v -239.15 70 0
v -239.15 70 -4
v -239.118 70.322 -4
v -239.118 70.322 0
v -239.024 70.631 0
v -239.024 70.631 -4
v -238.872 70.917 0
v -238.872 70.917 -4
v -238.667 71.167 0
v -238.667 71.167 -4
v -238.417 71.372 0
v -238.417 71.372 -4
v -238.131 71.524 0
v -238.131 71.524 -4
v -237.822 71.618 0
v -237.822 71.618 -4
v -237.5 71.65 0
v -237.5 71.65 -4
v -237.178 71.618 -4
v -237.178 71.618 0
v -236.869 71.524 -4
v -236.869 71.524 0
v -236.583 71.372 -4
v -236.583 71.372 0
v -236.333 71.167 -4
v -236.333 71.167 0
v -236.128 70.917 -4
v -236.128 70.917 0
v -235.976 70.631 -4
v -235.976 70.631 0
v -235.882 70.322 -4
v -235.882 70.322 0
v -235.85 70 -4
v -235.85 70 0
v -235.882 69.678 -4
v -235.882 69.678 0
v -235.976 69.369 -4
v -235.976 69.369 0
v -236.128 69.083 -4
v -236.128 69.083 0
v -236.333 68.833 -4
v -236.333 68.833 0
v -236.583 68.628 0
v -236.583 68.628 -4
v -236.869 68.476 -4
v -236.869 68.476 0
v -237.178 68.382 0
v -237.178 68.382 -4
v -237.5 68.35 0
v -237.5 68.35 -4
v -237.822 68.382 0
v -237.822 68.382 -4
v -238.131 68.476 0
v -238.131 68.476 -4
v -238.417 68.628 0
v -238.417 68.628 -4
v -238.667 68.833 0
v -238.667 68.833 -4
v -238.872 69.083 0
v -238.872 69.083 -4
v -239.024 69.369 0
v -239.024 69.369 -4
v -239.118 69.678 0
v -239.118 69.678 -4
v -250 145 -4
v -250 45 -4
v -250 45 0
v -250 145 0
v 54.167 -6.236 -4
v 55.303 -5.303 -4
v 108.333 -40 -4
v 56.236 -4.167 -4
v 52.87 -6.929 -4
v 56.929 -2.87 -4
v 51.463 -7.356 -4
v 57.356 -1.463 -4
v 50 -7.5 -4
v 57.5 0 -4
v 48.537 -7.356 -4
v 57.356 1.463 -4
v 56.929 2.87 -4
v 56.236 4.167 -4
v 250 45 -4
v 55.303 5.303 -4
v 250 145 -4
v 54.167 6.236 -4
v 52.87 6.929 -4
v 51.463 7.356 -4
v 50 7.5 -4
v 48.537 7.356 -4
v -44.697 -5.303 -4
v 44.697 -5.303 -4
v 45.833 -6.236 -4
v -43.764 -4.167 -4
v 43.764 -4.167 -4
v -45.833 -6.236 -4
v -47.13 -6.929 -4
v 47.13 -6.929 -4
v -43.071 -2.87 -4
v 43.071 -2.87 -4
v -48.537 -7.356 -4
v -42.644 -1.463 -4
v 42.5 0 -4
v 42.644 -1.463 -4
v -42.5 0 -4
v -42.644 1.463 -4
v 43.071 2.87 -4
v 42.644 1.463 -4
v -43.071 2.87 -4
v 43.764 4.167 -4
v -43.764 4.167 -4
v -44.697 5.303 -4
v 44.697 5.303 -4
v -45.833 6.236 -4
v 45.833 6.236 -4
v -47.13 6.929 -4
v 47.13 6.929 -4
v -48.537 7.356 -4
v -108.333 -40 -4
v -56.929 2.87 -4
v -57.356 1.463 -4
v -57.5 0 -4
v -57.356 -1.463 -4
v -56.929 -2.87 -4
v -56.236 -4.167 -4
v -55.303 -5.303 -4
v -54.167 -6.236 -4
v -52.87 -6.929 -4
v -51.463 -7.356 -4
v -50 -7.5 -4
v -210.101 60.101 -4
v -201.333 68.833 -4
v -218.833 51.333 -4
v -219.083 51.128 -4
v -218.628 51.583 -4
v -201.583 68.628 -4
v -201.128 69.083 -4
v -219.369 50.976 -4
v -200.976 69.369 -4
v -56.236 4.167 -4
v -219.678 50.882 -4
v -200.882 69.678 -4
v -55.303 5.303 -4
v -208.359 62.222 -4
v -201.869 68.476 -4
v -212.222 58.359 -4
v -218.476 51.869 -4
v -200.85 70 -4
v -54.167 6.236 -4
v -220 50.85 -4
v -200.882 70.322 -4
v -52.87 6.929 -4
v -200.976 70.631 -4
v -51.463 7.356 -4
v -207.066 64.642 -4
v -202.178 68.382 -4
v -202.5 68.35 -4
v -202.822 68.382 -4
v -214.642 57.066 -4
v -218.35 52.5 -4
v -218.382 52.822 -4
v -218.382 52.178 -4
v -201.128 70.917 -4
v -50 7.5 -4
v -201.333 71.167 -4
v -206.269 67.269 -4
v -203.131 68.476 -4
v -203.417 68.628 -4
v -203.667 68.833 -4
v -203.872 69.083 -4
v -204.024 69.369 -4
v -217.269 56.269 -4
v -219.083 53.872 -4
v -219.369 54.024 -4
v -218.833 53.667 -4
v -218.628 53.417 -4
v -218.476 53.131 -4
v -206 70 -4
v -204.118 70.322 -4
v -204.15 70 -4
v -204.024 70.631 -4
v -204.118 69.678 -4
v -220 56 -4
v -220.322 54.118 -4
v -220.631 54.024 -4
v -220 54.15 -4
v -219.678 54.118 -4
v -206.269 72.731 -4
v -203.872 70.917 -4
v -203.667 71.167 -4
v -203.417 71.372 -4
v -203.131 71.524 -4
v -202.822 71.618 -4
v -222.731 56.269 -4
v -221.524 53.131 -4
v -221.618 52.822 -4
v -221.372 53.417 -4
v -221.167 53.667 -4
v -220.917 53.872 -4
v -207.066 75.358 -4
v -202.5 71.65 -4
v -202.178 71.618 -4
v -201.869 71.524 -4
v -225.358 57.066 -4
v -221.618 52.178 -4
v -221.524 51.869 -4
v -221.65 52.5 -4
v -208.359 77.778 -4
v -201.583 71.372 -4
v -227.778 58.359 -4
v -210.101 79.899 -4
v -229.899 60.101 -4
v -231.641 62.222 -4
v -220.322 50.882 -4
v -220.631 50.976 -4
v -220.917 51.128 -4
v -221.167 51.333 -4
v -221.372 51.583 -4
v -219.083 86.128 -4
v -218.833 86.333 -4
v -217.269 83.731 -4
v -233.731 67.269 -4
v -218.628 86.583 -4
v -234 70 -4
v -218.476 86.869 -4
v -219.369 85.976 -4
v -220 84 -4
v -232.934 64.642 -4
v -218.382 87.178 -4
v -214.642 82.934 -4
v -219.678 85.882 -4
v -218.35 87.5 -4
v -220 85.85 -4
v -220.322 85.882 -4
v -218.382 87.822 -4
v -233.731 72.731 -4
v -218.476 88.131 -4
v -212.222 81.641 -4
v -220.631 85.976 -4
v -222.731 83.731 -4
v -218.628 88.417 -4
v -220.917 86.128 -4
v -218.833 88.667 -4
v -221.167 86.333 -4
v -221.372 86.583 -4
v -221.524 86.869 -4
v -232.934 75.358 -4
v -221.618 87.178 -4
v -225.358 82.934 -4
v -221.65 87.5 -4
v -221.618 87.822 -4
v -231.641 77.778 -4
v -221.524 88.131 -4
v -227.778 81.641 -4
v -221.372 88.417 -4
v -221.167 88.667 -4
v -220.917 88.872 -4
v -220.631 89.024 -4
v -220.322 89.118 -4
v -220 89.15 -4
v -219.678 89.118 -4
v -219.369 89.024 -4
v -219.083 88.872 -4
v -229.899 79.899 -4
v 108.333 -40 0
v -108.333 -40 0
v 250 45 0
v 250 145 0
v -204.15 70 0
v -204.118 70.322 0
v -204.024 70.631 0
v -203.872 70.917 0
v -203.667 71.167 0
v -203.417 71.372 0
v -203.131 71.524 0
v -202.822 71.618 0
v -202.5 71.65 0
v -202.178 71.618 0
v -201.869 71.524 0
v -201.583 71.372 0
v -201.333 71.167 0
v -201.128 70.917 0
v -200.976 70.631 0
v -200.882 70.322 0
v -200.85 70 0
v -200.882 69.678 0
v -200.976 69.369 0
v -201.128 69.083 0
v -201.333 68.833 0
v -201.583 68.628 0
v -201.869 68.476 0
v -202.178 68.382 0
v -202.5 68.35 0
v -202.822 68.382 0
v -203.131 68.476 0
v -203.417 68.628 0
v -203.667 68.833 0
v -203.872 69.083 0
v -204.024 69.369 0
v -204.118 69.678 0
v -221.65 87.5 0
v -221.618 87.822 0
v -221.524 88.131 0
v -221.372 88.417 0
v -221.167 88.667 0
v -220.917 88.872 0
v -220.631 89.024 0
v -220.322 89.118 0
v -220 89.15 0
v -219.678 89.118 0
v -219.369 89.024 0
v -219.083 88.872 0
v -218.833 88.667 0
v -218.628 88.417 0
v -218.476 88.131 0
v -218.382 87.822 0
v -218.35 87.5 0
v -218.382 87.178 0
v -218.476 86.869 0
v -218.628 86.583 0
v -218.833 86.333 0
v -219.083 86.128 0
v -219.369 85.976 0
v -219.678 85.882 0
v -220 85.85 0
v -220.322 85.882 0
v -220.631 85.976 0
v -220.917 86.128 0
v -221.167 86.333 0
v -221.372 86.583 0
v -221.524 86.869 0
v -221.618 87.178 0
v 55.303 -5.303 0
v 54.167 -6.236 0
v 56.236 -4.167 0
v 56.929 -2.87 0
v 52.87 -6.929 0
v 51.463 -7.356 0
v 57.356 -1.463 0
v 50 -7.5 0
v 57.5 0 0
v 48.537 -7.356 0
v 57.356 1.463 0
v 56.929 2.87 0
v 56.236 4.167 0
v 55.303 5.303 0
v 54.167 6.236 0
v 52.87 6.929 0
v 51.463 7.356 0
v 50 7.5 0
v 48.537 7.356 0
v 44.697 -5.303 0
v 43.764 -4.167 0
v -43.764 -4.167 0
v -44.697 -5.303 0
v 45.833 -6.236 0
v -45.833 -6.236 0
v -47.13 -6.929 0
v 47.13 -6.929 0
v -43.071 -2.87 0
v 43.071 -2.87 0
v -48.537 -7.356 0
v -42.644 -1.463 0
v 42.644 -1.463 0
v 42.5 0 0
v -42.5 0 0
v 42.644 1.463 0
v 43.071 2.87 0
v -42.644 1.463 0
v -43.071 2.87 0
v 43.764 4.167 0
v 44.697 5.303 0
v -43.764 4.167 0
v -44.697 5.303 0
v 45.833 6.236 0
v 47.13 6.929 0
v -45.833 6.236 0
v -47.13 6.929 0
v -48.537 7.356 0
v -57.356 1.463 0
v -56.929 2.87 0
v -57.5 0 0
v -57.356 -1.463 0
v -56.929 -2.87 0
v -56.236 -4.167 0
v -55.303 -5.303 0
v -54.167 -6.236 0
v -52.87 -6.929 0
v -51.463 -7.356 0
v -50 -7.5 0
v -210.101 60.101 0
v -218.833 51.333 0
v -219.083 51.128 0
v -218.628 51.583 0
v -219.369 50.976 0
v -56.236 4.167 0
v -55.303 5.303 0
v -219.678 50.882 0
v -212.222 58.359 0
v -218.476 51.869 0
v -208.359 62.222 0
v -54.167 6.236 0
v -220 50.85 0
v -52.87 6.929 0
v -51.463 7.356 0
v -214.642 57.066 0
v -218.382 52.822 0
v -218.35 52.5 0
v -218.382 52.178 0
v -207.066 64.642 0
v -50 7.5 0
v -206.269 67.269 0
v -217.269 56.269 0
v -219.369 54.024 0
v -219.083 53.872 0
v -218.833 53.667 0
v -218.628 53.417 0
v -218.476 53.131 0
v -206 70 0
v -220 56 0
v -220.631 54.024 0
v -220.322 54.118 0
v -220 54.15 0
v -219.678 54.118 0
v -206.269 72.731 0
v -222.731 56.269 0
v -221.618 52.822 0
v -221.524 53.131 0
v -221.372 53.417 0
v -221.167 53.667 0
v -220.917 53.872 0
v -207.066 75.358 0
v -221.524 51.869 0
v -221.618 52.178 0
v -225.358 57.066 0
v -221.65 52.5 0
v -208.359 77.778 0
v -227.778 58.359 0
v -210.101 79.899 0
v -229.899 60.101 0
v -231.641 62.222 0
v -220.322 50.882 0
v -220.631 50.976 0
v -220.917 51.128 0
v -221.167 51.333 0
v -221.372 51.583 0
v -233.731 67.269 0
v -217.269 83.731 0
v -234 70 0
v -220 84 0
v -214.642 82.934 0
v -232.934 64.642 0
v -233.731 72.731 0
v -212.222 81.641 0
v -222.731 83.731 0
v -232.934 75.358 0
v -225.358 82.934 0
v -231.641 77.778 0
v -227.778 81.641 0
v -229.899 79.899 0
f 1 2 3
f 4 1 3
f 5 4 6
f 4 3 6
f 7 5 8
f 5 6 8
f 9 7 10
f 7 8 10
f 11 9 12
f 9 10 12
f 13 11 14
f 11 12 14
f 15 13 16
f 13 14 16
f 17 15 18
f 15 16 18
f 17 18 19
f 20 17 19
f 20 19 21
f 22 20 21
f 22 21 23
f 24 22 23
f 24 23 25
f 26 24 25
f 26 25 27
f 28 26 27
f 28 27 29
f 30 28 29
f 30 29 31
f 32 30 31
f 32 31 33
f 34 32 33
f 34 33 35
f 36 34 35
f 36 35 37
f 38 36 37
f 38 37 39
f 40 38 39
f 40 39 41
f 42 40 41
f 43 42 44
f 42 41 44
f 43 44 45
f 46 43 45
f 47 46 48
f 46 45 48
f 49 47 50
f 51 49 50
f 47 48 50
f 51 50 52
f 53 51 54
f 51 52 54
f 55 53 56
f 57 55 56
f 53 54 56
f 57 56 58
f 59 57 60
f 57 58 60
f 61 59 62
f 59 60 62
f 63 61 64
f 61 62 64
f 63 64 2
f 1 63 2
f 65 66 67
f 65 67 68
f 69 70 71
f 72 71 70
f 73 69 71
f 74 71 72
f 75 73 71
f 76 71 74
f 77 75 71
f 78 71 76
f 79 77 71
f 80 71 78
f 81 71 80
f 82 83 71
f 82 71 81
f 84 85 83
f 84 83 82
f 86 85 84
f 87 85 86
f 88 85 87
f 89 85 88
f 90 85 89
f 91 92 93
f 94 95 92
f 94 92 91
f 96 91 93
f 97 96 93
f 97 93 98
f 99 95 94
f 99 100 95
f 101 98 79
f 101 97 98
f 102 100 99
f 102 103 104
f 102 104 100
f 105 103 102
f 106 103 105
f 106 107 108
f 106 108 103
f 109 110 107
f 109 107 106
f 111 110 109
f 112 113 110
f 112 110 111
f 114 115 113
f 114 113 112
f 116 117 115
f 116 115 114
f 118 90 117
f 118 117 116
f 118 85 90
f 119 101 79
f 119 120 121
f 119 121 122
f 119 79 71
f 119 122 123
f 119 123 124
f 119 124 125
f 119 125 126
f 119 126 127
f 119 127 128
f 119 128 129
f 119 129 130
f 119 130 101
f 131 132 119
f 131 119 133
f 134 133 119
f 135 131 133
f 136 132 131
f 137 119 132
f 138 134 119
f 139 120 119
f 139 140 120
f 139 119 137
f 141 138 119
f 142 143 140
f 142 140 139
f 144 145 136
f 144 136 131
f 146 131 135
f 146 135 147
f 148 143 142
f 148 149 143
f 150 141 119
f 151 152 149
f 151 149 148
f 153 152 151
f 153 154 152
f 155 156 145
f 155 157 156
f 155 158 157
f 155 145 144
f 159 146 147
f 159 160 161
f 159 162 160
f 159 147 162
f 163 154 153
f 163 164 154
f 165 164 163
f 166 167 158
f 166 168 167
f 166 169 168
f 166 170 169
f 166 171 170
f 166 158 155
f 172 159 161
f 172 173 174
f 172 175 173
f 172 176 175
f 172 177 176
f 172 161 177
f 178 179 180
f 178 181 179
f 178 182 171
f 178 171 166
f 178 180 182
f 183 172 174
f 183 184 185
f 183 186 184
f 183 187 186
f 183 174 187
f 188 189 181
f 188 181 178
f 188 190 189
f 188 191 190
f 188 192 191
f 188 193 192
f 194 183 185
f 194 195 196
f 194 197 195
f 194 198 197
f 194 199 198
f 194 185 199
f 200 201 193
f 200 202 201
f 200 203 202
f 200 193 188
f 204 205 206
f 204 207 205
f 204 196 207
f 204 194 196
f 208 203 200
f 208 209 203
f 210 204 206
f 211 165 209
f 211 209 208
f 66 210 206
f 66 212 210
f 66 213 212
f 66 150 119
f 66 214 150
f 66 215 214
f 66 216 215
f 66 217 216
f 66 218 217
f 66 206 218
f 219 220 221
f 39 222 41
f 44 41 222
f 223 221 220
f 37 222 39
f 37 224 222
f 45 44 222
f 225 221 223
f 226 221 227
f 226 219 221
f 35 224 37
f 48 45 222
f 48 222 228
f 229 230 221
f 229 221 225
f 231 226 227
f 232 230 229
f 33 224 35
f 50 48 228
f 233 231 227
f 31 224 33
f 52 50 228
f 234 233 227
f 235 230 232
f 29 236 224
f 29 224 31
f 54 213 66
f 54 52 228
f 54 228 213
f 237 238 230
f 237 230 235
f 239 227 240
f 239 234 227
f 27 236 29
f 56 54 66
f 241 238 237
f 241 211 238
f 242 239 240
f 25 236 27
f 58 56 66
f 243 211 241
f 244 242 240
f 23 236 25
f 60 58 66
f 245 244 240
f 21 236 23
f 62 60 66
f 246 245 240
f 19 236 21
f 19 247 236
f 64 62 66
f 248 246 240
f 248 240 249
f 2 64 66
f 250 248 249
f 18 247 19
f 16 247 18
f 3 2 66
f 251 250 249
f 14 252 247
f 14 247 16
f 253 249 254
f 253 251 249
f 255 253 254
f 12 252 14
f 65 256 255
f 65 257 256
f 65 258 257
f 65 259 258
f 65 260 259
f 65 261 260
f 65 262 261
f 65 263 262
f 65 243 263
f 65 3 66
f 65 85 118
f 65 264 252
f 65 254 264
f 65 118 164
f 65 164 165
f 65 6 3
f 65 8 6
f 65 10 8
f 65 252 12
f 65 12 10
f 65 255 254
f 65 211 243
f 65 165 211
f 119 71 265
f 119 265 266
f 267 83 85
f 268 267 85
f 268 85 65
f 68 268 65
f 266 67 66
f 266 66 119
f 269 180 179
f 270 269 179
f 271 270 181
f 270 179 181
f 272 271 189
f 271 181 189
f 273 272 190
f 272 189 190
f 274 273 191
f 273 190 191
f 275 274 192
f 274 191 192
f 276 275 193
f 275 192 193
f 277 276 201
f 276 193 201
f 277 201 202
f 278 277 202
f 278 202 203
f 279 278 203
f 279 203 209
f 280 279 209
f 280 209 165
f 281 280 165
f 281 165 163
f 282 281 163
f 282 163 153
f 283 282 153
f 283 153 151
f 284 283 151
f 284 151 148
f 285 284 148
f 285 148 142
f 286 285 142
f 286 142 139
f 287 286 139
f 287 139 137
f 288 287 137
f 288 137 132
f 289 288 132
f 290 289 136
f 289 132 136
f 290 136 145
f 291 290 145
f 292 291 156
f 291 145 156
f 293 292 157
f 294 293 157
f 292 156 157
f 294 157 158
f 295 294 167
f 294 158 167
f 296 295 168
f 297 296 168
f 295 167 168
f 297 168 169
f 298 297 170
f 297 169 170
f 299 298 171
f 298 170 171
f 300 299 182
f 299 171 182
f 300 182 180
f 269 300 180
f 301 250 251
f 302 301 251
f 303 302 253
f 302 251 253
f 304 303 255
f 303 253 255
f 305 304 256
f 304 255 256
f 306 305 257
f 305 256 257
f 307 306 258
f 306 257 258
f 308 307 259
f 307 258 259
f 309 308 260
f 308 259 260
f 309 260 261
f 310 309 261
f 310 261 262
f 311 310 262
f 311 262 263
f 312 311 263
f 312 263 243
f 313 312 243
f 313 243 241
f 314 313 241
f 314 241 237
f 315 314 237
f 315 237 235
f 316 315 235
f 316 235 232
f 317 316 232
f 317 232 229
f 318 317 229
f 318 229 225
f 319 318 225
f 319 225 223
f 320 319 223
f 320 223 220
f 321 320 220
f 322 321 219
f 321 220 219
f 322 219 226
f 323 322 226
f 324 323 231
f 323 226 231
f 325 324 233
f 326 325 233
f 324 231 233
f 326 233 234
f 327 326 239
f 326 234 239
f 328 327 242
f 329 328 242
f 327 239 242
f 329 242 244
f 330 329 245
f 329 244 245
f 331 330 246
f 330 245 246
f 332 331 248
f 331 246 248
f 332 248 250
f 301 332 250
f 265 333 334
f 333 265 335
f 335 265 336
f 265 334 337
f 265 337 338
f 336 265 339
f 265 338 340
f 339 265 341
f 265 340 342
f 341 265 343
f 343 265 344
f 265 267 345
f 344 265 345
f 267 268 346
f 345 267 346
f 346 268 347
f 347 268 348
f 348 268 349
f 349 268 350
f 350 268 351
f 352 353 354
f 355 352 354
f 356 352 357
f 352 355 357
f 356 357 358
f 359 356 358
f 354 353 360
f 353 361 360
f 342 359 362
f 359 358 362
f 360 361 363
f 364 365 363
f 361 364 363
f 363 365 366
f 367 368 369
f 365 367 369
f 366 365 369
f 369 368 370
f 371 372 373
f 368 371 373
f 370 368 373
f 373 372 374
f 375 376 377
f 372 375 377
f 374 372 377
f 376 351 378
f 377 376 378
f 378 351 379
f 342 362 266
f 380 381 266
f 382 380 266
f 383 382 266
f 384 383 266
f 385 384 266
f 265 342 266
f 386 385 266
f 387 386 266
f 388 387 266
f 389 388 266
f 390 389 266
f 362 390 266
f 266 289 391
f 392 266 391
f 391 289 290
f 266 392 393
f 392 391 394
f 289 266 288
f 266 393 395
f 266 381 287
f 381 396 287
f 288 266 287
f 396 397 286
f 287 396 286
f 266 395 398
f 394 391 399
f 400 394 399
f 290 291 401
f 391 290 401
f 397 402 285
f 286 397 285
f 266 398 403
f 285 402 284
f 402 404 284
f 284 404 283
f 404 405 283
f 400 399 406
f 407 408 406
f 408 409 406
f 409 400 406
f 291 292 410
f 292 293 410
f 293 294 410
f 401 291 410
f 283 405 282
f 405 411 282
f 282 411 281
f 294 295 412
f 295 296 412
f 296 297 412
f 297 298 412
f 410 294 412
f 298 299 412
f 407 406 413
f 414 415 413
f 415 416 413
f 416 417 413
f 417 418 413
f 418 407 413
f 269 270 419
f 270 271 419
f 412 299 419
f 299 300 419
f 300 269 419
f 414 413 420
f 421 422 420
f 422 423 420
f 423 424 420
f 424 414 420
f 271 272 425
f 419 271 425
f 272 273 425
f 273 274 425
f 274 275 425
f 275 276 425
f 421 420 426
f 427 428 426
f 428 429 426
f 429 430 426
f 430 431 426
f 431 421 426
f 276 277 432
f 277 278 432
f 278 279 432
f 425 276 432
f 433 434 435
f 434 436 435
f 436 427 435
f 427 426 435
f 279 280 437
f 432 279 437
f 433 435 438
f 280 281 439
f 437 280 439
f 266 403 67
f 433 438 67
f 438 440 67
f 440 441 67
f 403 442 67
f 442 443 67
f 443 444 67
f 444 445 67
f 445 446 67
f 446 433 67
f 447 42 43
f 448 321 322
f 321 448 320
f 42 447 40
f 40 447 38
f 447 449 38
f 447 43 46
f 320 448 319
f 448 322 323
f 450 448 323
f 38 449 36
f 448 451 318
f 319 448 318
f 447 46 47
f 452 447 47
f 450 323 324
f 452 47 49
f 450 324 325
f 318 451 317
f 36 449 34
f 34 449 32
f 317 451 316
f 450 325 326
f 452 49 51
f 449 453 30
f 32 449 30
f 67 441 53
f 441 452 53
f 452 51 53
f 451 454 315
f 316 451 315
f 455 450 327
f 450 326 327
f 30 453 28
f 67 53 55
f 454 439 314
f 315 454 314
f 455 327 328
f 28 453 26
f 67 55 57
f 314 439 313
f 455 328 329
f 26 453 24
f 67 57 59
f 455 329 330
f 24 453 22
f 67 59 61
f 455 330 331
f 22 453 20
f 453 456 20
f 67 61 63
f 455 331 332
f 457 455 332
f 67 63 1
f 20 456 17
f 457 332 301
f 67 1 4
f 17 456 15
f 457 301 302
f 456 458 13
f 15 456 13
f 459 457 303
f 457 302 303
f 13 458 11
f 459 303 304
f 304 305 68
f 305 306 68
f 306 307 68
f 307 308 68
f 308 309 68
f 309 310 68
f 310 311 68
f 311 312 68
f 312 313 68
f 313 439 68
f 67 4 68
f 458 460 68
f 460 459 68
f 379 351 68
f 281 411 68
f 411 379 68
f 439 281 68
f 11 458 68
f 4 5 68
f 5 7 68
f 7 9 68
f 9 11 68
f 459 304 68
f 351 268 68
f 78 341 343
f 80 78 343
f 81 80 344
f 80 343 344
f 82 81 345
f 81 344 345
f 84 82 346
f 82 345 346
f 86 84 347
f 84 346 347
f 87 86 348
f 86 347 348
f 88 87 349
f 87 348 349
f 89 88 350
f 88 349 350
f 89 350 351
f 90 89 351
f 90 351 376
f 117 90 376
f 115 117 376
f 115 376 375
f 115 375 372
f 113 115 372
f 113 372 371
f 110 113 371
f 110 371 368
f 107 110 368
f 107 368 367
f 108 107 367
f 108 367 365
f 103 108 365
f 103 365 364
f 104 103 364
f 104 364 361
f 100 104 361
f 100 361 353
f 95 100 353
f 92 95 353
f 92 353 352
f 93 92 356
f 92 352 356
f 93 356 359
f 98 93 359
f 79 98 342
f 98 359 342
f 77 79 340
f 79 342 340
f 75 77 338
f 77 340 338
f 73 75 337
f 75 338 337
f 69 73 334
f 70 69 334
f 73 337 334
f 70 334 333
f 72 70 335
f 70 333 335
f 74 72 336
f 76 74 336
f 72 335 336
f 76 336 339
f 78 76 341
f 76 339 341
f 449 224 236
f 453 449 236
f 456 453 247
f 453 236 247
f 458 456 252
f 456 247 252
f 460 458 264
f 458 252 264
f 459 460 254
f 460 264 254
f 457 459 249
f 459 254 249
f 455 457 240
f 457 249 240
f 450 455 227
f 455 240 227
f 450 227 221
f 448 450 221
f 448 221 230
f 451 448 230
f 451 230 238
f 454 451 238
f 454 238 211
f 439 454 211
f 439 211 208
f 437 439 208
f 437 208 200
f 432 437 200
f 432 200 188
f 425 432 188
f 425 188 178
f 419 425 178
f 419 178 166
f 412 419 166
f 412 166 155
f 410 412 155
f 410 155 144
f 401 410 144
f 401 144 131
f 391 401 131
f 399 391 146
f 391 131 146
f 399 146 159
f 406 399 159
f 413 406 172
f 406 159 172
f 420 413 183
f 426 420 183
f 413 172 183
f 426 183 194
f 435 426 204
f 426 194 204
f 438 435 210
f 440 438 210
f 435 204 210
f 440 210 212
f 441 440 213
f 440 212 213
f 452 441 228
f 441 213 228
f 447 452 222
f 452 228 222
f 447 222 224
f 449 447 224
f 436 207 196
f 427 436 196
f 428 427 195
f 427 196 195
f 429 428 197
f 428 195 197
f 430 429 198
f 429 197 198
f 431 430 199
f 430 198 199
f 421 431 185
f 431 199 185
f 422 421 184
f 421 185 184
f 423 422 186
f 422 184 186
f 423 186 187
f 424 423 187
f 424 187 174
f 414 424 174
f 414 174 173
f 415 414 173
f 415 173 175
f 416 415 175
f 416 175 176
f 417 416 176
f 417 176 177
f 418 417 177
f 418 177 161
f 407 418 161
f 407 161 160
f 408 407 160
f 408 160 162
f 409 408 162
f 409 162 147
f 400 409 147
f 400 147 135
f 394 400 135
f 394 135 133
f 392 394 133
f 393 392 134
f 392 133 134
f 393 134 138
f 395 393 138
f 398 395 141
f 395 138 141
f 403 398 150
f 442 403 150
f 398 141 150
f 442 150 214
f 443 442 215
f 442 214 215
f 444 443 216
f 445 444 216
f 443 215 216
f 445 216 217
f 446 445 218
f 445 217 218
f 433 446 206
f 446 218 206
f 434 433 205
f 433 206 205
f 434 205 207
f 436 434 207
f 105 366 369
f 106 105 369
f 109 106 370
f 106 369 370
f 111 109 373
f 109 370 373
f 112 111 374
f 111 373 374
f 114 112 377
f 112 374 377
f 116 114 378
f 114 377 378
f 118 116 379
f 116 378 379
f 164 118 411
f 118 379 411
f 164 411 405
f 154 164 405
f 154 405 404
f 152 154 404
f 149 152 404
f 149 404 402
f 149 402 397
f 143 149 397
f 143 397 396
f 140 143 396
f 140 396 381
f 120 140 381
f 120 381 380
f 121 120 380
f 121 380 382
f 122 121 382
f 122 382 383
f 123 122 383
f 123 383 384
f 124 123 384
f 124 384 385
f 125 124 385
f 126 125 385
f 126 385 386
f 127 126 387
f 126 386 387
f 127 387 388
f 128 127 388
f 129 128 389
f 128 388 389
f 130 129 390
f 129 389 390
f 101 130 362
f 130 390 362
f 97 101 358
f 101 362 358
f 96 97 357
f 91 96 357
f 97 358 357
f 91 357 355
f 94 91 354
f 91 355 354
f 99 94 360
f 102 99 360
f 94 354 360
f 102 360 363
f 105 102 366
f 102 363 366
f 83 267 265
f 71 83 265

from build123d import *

# Parameters (mm, degrees)
SKETCH_2_W             = 500
SKETCH_2_H             = 150
SM_BASE_FLANGE_1_DEPTH = 4
SKETCH_7_R             = 7.5
CUT_EXTRUDE_1_DEPTH    = 10
CUT_EXTRUDE_2_DEPTH    = 10
SKETCH_9_W             = 500
SKETCH_9_H             = 70
EXTRUDE_1_DEPTH        = 4
SKETCH_11_W            = 294.318295345
SKETCH_11_H            = 76.206928483
CUT_EXTRUDE_3_DEPTH    = 10
SKETCH_12_R            = 14
CUT_EXTRUDE_4_DEPTH    = 10
SKETCH_13_R            = 1.65
CUT_EXTRUDE_5_DEPTH    = 10


# Sheet-metal steps are written as plain solids
with BuildPart() as part:
    # Sketch 2 → 基体-法兰1 (new body)
    with BuildSketch(Plane.XY):
        Rectangle(SKETCH_2_W, SKETCH_2_H)
    extrude(amount=-SM_BASE_FLANGE_1_DEPTH)

    # 草图7 → 切除-拉伸1 (cut)
    with BuildSketch(Plane.XY):
        with Locations((-50, 0)):
            Circle(SKETCH_7_R)
        with Locations((50, 0)):
            Circle(SKETCH_7_R)
    extrude(amount=-CUT_EXTRUDE_1_DEPTH, mode=Mode.SUBTRACT)

    # 草图8 → 切除-拉伸2 (cut)
    with BuildSketch(Plane.XY):
        Polygon((250, 45), (50, -75), (250, -75), align=None)
        Polygon((-250, -75), (-250, 45), (-50, -75), align=None)
    extrude(amount=-CUT_EXTRUDE_2_DEPTH, mode=Mode.SUBTRACT)

    # 草图9 → 凸台-拉伸1 (add)
    with BuildSketch(Plane(origin=(0, 0, -4), x_dir=(-1, 0, 0), z_dir=(0, 0, -1))):
        with Locations((0, 110)):
            Rectangle(SKETCH_9_W, SKETCH_9_H)
    extrude(amount=-EXTRUDE_1_DEPTH)

    # 草图11 → 切除-拉伸3 (cut)
    with BuildSketch(Plane(origin=(0, 0, -4), x_dir=(-1, 0, 0), z_dir=(0, 0, -1))):
        with Locations((38.825814339, -78.103464242)):
            Rectangle(SKETCH_11_W, SKETCH_11_H)
    extrude(amount=-CUT_EXTRUDE_3_DEPTH, mode=Mode.SUBTRACT)

    # 草图12 → 切除-拉伸4 (cut)
    with BuildSketch(Plane(origin=(0, 0, -4), x_dir=(-1, 0, 0), z_dir=(0, 0, -1))):
        with Locations((220, 70)):
            Circle(SKETCH_12_R)
    extrude(amount=-CUT_EXTRUDE_4_DEPTH, mode=Mode.SUBTRACT)

    # 草图13 → 切除-拉伸5 (cut)
    with BuildSketch(Plane(origin=(0, 0, -4), x_dir=(-1, 0, 0), z_dir=(0, 0, -1))):
        with Locations((220, 87.5)):
            Circle(SKETCH_13_R)
        with Locations((237.5, 70)):
            Circle(SKETCH_13_R)
        with Locations((220, 52.5)):
            Circle(SKETCH_13_R)
        with Locations((202.5, 70)):
            Circle(SKETCH_13_R)
    extrude(amount=-CUT_EXTRUDE_5_DEPTH, mode=Mode.SUBTRACT)


solid = part.part
